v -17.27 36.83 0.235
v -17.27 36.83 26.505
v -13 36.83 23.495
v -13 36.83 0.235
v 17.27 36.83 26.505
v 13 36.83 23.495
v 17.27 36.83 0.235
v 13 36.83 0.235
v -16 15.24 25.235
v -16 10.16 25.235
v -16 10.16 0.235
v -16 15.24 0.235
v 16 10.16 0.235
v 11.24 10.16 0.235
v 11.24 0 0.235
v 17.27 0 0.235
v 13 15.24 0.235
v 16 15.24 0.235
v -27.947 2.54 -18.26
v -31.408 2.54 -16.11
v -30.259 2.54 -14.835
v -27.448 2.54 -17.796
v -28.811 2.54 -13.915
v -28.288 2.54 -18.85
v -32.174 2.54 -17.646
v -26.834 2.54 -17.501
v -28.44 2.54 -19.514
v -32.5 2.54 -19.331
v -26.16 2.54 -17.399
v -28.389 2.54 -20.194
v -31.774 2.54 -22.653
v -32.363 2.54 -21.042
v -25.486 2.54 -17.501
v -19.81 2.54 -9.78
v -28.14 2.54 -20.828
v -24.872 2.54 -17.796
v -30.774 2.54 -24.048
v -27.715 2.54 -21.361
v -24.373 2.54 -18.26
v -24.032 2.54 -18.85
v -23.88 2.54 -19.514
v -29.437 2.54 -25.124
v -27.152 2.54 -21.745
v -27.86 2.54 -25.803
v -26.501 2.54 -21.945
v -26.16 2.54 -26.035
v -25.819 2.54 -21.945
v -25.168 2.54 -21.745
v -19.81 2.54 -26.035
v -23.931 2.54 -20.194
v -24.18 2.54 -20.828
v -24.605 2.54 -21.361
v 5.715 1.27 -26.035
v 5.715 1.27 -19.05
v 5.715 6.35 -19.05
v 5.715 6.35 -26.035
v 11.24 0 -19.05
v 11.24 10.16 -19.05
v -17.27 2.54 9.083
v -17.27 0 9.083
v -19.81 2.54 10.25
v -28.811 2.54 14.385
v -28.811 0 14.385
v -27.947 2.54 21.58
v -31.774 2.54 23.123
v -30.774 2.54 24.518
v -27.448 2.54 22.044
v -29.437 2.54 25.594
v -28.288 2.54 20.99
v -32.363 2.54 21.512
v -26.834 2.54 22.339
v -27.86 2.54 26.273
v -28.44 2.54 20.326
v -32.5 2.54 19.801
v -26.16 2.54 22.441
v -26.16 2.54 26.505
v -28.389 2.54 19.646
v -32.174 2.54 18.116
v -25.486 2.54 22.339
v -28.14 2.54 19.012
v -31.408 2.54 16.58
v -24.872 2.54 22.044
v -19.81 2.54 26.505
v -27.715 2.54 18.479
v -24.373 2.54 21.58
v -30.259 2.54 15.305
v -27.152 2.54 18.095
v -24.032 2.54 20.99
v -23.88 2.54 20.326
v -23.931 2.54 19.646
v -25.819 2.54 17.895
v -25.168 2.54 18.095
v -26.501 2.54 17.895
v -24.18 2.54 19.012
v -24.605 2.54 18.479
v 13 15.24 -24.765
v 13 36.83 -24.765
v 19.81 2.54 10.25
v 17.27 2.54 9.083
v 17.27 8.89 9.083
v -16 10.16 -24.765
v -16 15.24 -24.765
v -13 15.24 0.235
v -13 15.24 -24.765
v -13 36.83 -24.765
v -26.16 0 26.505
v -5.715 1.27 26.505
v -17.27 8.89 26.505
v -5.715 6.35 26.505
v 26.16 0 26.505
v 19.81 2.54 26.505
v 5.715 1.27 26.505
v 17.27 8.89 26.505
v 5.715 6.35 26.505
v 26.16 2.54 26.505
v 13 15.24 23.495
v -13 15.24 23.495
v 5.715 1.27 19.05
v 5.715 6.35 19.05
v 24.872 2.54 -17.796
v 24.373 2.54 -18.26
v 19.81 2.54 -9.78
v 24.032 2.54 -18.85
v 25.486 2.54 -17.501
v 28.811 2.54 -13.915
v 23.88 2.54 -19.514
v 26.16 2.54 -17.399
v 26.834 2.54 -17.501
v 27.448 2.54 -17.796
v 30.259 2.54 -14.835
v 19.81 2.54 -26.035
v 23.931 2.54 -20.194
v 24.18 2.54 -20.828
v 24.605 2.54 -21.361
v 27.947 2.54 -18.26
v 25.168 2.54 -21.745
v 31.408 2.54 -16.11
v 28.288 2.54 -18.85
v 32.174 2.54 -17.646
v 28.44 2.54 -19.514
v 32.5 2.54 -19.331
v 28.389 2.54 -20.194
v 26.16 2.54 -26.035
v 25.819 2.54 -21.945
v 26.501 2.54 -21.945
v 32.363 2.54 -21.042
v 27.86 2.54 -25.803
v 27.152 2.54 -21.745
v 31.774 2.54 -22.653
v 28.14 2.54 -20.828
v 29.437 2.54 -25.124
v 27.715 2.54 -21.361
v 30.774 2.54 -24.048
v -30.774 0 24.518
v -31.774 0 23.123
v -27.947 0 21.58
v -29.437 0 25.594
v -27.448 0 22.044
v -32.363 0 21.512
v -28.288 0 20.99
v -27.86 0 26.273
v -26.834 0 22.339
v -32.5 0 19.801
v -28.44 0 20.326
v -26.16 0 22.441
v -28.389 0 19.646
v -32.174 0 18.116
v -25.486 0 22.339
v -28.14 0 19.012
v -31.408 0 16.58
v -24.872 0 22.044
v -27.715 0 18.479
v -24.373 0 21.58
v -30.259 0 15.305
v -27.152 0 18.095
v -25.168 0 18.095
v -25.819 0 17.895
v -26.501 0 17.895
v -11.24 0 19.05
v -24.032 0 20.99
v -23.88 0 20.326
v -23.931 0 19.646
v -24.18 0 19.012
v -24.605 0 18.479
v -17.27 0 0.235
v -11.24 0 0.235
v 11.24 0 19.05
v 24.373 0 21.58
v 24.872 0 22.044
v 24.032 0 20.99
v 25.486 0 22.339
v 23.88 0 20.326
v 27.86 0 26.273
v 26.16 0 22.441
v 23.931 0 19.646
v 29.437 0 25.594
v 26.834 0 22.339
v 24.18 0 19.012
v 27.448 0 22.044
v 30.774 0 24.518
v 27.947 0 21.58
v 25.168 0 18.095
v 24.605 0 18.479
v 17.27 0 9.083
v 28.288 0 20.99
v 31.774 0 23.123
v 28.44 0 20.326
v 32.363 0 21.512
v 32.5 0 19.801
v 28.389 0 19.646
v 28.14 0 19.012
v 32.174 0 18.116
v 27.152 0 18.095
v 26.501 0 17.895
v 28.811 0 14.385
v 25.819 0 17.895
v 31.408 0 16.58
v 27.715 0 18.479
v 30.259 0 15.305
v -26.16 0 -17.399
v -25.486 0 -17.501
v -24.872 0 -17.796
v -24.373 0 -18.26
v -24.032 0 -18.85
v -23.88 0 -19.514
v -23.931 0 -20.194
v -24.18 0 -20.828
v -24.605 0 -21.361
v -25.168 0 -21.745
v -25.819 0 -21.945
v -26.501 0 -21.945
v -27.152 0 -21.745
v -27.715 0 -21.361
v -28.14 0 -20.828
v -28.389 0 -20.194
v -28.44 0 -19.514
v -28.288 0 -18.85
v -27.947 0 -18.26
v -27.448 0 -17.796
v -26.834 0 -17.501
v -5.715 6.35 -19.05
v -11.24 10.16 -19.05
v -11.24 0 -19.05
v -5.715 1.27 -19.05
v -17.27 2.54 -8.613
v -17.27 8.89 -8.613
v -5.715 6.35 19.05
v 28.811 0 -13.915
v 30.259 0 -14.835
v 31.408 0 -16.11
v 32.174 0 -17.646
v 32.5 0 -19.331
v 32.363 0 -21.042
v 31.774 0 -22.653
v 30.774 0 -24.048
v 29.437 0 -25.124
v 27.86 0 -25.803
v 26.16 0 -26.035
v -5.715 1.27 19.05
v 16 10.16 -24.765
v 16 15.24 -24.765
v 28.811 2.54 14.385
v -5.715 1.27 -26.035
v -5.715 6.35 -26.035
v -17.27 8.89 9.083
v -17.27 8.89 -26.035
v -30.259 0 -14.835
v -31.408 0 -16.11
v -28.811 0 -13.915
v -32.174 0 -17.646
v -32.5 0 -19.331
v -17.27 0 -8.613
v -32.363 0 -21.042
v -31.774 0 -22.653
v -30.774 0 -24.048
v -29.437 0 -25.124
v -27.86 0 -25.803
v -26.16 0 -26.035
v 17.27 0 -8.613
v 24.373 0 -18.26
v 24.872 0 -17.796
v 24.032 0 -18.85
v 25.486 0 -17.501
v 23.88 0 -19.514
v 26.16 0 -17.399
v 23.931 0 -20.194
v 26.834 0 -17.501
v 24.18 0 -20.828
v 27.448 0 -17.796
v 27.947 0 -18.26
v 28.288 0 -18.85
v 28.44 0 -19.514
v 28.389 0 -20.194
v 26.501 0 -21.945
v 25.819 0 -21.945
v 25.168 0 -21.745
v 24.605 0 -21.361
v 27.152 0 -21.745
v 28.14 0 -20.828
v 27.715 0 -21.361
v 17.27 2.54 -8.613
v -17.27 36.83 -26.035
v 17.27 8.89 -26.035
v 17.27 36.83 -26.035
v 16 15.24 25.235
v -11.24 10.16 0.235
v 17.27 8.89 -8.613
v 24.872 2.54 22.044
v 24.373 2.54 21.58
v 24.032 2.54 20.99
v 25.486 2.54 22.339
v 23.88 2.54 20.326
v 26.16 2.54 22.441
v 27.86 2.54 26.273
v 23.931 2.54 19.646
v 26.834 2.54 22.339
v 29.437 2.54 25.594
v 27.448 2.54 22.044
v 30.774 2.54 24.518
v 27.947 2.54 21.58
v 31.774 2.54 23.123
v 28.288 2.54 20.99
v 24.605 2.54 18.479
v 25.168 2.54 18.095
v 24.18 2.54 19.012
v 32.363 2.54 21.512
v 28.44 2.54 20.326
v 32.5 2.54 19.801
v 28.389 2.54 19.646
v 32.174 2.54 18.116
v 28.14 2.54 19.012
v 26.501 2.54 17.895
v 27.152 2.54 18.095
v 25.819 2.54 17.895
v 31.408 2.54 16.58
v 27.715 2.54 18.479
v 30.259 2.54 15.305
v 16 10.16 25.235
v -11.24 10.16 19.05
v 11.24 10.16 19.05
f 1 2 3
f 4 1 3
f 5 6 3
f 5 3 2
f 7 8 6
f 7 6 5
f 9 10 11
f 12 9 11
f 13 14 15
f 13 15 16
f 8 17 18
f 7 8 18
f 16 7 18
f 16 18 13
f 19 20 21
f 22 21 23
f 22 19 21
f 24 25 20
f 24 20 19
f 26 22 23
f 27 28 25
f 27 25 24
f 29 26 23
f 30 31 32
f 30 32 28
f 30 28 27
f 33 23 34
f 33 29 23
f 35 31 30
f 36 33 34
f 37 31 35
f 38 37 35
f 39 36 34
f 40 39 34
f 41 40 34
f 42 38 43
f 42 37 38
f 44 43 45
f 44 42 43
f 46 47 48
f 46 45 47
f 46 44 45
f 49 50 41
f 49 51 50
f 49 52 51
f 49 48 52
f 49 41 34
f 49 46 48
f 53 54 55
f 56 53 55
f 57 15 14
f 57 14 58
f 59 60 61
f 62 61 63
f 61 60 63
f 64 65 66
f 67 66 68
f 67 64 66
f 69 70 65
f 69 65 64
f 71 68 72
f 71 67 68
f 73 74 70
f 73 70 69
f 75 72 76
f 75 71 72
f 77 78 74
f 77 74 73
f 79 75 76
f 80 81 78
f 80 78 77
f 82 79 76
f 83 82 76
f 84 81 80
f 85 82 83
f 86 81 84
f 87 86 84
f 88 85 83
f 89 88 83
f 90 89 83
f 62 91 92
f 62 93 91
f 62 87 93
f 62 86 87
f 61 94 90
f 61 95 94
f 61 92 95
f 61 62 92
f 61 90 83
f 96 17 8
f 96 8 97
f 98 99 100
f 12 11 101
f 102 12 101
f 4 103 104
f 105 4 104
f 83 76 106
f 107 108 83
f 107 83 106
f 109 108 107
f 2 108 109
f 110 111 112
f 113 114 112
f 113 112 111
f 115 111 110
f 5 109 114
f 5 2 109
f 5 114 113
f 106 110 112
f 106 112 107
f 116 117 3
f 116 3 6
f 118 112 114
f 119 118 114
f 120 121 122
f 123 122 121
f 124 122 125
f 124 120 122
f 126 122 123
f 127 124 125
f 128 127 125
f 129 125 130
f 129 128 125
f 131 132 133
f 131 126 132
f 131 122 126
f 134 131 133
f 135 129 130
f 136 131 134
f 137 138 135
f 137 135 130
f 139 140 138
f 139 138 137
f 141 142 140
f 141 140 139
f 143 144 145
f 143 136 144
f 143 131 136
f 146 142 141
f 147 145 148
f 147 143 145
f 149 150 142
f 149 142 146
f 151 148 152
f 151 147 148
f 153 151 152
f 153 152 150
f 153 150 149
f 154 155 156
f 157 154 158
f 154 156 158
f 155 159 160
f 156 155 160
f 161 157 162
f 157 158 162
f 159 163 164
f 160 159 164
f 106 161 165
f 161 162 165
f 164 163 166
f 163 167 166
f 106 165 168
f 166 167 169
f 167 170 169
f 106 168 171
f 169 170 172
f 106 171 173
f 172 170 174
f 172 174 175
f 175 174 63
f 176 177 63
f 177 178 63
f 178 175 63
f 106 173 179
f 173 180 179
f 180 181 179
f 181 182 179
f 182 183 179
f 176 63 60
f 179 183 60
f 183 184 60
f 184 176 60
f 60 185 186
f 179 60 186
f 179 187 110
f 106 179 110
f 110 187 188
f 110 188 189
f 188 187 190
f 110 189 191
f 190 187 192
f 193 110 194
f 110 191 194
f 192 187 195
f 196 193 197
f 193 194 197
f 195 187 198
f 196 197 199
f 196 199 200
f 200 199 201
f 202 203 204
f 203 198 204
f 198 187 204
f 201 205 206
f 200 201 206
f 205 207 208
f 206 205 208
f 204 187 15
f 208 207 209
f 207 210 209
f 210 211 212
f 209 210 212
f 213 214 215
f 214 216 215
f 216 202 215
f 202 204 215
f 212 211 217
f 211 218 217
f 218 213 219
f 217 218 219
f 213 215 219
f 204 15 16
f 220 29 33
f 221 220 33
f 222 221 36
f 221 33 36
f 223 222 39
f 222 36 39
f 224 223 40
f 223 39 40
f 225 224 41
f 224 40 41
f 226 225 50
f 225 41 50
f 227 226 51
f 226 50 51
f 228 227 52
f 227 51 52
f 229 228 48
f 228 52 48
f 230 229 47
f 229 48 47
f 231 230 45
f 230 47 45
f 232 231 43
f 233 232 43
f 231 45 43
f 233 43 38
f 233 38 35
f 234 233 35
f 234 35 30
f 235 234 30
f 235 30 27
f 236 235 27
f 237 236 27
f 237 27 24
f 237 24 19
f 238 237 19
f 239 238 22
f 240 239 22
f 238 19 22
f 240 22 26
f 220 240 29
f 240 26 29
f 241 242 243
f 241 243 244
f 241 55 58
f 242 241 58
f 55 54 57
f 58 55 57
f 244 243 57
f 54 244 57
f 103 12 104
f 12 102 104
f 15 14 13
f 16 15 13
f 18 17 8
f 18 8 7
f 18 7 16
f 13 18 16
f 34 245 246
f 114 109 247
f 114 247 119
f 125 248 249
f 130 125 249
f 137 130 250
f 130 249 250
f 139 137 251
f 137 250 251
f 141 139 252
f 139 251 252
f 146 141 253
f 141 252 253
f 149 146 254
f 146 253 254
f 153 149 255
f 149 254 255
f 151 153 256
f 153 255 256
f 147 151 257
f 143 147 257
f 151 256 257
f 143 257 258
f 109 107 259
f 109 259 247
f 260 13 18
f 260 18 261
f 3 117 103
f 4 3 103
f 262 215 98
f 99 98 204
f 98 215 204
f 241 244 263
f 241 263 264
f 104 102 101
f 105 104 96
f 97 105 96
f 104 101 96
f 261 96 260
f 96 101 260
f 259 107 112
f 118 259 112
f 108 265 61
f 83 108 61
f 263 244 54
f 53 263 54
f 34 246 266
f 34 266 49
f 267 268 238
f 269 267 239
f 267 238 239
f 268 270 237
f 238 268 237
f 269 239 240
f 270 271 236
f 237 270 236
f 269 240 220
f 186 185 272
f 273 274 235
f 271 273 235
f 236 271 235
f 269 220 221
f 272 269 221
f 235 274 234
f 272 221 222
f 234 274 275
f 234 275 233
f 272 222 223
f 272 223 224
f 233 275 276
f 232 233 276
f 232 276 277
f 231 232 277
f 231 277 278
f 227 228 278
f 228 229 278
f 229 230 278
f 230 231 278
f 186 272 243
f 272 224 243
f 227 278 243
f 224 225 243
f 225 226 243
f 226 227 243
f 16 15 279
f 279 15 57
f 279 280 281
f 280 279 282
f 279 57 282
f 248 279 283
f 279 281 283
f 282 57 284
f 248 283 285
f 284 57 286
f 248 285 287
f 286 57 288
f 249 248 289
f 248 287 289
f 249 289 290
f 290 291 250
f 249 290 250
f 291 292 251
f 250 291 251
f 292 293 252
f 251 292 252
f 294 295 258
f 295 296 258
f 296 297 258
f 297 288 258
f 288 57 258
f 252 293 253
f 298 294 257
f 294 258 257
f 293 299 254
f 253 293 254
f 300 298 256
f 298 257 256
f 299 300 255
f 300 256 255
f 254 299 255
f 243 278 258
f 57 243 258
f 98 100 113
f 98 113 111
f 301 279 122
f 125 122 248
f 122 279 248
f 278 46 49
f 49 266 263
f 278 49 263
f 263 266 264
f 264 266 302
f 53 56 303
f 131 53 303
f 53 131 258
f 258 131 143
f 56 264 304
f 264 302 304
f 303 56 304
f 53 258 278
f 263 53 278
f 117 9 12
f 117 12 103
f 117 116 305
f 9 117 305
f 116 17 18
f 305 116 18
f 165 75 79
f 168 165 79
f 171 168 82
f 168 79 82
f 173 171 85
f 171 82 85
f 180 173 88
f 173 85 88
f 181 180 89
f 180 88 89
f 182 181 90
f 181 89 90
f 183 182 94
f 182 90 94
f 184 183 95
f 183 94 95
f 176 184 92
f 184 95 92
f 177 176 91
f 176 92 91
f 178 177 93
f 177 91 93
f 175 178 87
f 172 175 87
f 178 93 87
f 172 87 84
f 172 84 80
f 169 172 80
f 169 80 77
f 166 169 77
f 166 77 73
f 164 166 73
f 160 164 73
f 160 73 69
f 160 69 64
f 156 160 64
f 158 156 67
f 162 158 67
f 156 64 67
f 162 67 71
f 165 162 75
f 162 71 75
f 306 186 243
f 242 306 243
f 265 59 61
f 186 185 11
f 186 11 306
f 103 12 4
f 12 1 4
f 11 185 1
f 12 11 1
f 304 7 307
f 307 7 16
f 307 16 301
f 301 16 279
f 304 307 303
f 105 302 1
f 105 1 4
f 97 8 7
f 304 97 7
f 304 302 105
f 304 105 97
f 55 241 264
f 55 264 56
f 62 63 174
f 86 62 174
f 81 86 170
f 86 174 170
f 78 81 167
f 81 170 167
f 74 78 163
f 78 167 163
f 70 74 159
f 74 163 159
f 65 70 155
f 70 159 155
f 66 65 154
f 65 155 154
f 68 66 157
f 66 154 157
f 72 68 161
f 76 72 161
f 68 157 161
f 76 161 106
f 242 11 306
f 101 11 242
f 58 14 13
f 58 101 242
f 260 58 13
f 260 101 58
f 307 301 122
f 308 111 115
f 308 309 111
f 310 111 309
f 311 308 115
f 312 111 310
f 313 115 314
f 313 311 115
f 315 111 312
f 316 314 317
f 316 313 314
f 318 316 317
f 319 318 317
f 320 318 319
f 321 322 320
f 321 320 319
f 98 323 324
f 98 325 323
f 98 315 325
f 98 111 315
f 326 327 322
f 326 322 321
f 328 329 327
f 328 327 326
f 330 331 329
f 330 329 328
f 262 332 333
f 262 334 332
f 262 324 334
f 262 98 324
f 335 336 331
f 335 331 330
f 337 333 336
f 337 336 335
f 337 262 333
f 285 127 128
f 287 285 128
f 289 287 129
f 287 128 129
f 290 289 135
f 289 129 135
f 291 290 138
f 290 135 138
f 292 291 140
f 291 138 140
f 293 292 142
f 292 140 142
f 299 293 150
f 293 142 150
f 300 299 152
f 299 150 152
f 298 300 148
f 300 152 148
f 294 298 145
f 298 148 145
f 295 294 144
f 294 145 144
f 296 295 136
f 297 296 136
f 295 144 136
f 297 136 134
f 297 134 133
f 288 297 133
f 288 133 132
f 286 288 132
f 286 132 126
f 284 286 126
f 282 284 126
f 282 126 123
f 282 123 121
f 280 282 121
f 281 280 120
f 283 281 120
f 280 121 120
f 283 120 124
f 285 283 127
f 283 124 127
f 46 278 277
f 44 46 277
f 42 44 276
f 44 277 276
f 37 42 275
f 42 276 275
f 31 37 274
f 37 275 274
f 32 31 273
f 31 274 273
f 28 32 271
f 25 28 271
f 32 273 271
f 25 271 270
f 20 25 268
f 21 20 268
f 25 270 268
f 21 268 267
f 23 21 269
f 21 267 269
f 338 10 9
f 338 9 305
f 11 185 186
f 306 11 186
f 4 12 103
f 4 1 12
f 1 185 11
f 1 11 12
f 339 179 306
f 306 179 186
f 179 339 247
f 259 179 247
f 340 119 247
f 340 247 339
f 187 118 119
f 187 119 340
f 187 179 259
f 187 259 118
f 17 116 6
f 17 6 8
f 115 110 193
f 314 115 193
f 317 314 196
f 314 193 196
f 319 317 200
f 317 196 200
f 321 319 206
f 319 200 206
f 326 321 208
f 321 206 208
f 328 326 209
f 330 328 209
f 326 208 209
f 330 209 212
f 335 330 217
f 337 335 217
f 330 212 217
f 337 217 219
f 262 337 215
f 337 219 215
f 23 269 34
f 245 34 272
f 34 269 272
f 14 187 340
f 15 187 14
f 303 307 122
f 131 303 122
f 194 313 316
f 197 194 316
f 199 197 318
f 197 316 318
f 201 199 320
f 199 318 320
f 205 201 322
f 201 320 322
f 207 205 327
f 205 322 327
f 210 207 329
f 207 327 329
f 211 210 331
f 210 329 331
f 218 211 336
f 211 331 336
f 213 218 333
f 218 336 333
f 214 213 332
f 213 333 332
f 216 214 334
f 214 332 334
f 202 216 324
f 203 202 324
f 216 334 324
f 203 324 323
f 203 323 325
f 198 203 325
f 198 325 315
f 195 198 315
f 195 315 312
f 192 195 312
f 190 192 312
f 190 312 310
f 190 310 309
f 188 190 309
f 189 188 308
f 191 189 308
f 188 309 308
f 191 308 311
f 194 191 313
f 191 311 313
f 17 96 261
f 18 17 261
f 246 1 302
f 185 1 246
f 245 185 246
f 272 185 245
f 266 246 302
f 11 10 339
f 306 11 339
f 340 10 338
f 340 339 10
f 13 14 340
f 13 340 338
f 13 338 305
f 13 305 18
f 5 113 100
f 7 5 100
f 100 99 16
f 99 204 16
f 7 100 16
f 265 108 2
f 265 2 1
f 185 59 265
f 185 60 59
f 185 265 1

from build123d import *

# Parameters (mm, degrees)
SKETCH3_W            = 34.54
SKETCH3_H            = 52.54
SKETCH3_W_2          = 22.479
SKETCH3_H_2          = 38.1
BOSS_EXTRUDE1_DEPTH  = 10.16
SKETCH4_W            = 34.54
SKETCH4_H            = 52.54
SKETCH4_W_2          = 32
SKETCH4_H_2          = 50
BOSS_EXTRUDE2_DEPTH  = 5.08
SKETCH6_W            = 34.54
SKETCH6_H            = 52.54
SKETCH6_W_2          = 26
SKETCH6_H_2          = 48.26
BOSS_EXTRUDE3_DEPTH  = 21.59
CUT_EXTRUDE1_REACH   = 68.447
SKETCH8_W            = 11.43
SKETCH8_H            = 5.08
BOSS_EXTRUDE5_DEPTH  = 2.54
SKETCH13_R           = 2.286
CUT_EXTRUDE6_DEPTH   = 2.54
BOSS_EXTRUDE6_DEPTH  = 17.421603206
CUT_EXTRUDE7_DEPTH   = 55.177663525
MIRROR5_COPY_1_DEPTH = 17.421603206
MIRROR5_COPY_2_DEPTH = 55.177663525


with BuildPart() as part:
    # Sketch3 → Boss-Extrude1 (new body)
    with BuildSketch(Plane(origin=(0, 0, 0), x_dir=(1, 0, 0), z_dir=(0, 1, 0))):
        with Locations((0, -0.235)):
            Rectangle(SKETCH3_W, SKETCH3_H)
        Rectangle(SKETCH3_W_2, SKETCH3_H_2, mode=Mode.SUBTRACT)
    extrude(amount=BOSS_EXTRUDE1_DEPTH)

    # Sketch4 → Boss-Extrude2 (add)
    with BuildSketch(Plane(origin=(0, 10.16, 0), x_dir=(1, 0, 0), z_dir=(0, 1, 0))):
        with Locations((0, -0.235)):
            Rectangle(SKETCH4_W, SKETCH4_H)
        with Locations((0, -0.235)):
            Rectangle(SKETCH4_W_2, SKETCH4_H_2, mode=Mode.SUBTRACT)
    extrude(amount=BOSS_EXTRUDE2_DEPTH)

    # Sketch6 → Boss-Extrude3 (add)
    with BuildSketch(Plane(origin=(0, 15.24, 0), x_dir=(1, 0, 0), z_dir=(0, 1, 0))):
        with Locations((0, -0.235)):
            Rectangle(SKETCH6_W, SKETCH6_H)
        with Locations((0, 0.635)):
            Rectangle(SKETCH6_W_2, SKETCH6_H_2, mode=Mode.SUBTRACT)
    extrude(amount=BOSS_EXTRUDE3_DEPTH)

    # Cut-Extrude1: up to this face of the body (flat: up to its plane)
    cut_extrude1_end = Plane(part.part.faces().sort_by_distance((0, 18.415, -26.035))[0])
    # Sketch8 → Cut-Extrude1 (cut, up to the picked face)
    with BuildSketch(Plane.XY.offset(26.505), mode=Mode.PRIVATE) as cut_extrude1_sk1:
        with Locations((0, 3.81)):
            Rectangle(SKETCH8_W, SKETCH8_H)
    cut_extrude1_tool1 = split(extrude(cut_extrude1_sk1.sketch, amount=-CUT_EXTRUDE1_REACH, mode=Mode.PRIVATE), bisect_by=cut_extrude1_end, keep=Keep.BOTH, mode=Mode.PRIVATE)
    add(cut_extrude1_tool1.solids().sort_by(Axis((0, 3.81, 26.505), (0, 0, -1)))[0], mode=Mode.SUBTRACT)

    # Sketch12 → Boss-Extrude5 (add)
    with BuildSketch(Plane(origin=(0, 0, 0), x_dir=(1, 0, 0), z_dir=(0, 1, 0))):
        with BuildLine():
            Line((17.27, 8.613396683), (28.810641327, 13.914679337))
            ThreePointArc((28.810641327, 13.914679337), (32.363387631, 21.041643613), (26.16, 26.035))
            Line((26.16, 26.035), (17.27, 26.035))
            Line((17.27, 26.035), (17.27, 8.613396683))
        make_face()
        with BuildLine():
            Line((17.27, -26.505), (26.16, -26.505))
            ThreePointArc((26.16, -26.505), (32.363387631, -21.511643613), (28.810641327, -14.384679337))
            Line((28.810641327, -14.384679337), (17.27, -9.083396683))
            Line((17.27, -9.083396683), (17.27, -26.505))
        make_face()
        with BuildLine():
            Line((-17.27, -9.083396683), (-28.810641327, -14.384679337))
            ThreePointArc((-28.810641327, -14.384679337), (-32.363387631, -21.511643613), (-26.16, -26.505))
            Line((-26.16, -26.505), (-17.27, -26.505))
            Line((-17.27, -26.505), (-17.27, -9.083396683))
        make_face()
        with BuildLine():
            Line((-28.810641327, 13.914679337), (-17.27, 8.613396683))
            Line((-17.27, 8.613396683), (-17.27, 26.035))
            Line((-17.27, 26.035), (-26.16, 26.035))
            ThreePointArc((-26.16, 26.035), (-32.363387631, 21.041643613), (-28.810641327, 13.914679337))
        make_face()
    extrude(amount=BOSS_EXTRUDE5_DEPTH)

    # Sketch13 → Cut-Extrude6 (cut)
    with BuildSketch(Plane(origin=(0, 2.54, 0), x_dir=(1, 0, 0), z_dir=(0, 1, 0))):
        with Locations(Location((26.16, 19.685, 0), (0, 0, 270))):
            Circle(SKETCH13_R)
        with Locations(Location((26.16, -20.155, 0), (0, 0, 270))):
            Circle(SKETCH13_R)
        with Locations(Location((-26.16, -20.155, 0), (0, 0, 270))):
            Circle(SKETCH13_R)
        with Locations(Location((-26.16, 19.685, 0), (0, 0, 270))):
            Circle(SKETCH13_R)
    extrude(amount=-CUT_EXTRUDE6_DEPTH, mode=Mode.SUBTRACT)

    # Sketch14 → Boss-Extrude6 (add)
    with BuildSketch(Plane.XY.offset(26.505)):
        Polygon((17.27, 8.89), (19.81, 2.54), (17.27, 2.54), align=None)
    boss_extrude6 = extrude(amount=-BOSS_EXTRUDE6_DEPTH)

    # Sketch15 → Cut-Extrude7 (cut, through all)
    with BuildSketch(Plane.XZ.offset(-2.54)):
        Polygon((17.27, 9.083396794), (19.81, 10.250165285), (19.81, 9.083396794), align=None)
    cut_extrude7 = extrude(amount=-CUT_EXTRUDE7_DEPTH, mode=Mode.SUBTRACT)

    # Mirror4: Boss-Extrude6, Cut-Extrude7 across plane
    add(boss_extrude6.mirror(Plane(origin=(0, 0, 0), x_dir=(0, 0, 1), z_dir=(1, 0, 0))))
    add(cut_extrude7.mirror(Plane(origin=(0, 0, 0), x_dir=(0, 0, 1), z_dir=(1, 0, 0))), mode=Mode.SUBTRACT)

    # Mirror5: Boss-Extrude6, Cut-Extrude7 across plane
    add(boss_extrude6.mirror(Plane.XY.offset(0.235)))
    add(cut_extrude7.mirror(Plane.XY.offset(0.235)), mode=Mode.SUBTRACT)

    # Mirror5 copy 1 sketch → Mirror5 copy 1 (add)
    with BuildSketch(Plane(origin=(0, 0, -26.035), x_dir=(-1, 0, 0), z_dir=(0, 0, -1))):
        Polygon((17.27, 8.89), (19.81, 2.54), (17.27, 2.54), align=None)
    extrude(amount=-MIRROR5_COPY_1_DEPTH)

    # Mirror5 copy 2 sketch → Mirror5 copy 2 (cut, through all)
    with BuildSketch(Plane(origin=(0, 2.54, 0.47), x_dir=(-1, 0, 0), z_dir=(0, -1, 0))):
        Polygon((17.27, 9.083396794), (19.81, 10.250165285), (19.81, 9.083396794), align=None)
    extrude(amount=-MIRROR5_COPY_2_DEPTH, mode=Mode.SUBTRACT)


with BuildPart() as body_2:
    # Split3: the piece on the far side of the plane
    add(part.part)
    split(bisect_by=Plane.XY.offset(0.235), keep=Keep.BOTTOM)


with BuildPart() as part_1:
    add(part.part)

    # Split3
    split(bisect_by=Plane.XY.offset(0.235), keep=Keep.TOP)


solid = Compound([body_2.part, part_1.part])
